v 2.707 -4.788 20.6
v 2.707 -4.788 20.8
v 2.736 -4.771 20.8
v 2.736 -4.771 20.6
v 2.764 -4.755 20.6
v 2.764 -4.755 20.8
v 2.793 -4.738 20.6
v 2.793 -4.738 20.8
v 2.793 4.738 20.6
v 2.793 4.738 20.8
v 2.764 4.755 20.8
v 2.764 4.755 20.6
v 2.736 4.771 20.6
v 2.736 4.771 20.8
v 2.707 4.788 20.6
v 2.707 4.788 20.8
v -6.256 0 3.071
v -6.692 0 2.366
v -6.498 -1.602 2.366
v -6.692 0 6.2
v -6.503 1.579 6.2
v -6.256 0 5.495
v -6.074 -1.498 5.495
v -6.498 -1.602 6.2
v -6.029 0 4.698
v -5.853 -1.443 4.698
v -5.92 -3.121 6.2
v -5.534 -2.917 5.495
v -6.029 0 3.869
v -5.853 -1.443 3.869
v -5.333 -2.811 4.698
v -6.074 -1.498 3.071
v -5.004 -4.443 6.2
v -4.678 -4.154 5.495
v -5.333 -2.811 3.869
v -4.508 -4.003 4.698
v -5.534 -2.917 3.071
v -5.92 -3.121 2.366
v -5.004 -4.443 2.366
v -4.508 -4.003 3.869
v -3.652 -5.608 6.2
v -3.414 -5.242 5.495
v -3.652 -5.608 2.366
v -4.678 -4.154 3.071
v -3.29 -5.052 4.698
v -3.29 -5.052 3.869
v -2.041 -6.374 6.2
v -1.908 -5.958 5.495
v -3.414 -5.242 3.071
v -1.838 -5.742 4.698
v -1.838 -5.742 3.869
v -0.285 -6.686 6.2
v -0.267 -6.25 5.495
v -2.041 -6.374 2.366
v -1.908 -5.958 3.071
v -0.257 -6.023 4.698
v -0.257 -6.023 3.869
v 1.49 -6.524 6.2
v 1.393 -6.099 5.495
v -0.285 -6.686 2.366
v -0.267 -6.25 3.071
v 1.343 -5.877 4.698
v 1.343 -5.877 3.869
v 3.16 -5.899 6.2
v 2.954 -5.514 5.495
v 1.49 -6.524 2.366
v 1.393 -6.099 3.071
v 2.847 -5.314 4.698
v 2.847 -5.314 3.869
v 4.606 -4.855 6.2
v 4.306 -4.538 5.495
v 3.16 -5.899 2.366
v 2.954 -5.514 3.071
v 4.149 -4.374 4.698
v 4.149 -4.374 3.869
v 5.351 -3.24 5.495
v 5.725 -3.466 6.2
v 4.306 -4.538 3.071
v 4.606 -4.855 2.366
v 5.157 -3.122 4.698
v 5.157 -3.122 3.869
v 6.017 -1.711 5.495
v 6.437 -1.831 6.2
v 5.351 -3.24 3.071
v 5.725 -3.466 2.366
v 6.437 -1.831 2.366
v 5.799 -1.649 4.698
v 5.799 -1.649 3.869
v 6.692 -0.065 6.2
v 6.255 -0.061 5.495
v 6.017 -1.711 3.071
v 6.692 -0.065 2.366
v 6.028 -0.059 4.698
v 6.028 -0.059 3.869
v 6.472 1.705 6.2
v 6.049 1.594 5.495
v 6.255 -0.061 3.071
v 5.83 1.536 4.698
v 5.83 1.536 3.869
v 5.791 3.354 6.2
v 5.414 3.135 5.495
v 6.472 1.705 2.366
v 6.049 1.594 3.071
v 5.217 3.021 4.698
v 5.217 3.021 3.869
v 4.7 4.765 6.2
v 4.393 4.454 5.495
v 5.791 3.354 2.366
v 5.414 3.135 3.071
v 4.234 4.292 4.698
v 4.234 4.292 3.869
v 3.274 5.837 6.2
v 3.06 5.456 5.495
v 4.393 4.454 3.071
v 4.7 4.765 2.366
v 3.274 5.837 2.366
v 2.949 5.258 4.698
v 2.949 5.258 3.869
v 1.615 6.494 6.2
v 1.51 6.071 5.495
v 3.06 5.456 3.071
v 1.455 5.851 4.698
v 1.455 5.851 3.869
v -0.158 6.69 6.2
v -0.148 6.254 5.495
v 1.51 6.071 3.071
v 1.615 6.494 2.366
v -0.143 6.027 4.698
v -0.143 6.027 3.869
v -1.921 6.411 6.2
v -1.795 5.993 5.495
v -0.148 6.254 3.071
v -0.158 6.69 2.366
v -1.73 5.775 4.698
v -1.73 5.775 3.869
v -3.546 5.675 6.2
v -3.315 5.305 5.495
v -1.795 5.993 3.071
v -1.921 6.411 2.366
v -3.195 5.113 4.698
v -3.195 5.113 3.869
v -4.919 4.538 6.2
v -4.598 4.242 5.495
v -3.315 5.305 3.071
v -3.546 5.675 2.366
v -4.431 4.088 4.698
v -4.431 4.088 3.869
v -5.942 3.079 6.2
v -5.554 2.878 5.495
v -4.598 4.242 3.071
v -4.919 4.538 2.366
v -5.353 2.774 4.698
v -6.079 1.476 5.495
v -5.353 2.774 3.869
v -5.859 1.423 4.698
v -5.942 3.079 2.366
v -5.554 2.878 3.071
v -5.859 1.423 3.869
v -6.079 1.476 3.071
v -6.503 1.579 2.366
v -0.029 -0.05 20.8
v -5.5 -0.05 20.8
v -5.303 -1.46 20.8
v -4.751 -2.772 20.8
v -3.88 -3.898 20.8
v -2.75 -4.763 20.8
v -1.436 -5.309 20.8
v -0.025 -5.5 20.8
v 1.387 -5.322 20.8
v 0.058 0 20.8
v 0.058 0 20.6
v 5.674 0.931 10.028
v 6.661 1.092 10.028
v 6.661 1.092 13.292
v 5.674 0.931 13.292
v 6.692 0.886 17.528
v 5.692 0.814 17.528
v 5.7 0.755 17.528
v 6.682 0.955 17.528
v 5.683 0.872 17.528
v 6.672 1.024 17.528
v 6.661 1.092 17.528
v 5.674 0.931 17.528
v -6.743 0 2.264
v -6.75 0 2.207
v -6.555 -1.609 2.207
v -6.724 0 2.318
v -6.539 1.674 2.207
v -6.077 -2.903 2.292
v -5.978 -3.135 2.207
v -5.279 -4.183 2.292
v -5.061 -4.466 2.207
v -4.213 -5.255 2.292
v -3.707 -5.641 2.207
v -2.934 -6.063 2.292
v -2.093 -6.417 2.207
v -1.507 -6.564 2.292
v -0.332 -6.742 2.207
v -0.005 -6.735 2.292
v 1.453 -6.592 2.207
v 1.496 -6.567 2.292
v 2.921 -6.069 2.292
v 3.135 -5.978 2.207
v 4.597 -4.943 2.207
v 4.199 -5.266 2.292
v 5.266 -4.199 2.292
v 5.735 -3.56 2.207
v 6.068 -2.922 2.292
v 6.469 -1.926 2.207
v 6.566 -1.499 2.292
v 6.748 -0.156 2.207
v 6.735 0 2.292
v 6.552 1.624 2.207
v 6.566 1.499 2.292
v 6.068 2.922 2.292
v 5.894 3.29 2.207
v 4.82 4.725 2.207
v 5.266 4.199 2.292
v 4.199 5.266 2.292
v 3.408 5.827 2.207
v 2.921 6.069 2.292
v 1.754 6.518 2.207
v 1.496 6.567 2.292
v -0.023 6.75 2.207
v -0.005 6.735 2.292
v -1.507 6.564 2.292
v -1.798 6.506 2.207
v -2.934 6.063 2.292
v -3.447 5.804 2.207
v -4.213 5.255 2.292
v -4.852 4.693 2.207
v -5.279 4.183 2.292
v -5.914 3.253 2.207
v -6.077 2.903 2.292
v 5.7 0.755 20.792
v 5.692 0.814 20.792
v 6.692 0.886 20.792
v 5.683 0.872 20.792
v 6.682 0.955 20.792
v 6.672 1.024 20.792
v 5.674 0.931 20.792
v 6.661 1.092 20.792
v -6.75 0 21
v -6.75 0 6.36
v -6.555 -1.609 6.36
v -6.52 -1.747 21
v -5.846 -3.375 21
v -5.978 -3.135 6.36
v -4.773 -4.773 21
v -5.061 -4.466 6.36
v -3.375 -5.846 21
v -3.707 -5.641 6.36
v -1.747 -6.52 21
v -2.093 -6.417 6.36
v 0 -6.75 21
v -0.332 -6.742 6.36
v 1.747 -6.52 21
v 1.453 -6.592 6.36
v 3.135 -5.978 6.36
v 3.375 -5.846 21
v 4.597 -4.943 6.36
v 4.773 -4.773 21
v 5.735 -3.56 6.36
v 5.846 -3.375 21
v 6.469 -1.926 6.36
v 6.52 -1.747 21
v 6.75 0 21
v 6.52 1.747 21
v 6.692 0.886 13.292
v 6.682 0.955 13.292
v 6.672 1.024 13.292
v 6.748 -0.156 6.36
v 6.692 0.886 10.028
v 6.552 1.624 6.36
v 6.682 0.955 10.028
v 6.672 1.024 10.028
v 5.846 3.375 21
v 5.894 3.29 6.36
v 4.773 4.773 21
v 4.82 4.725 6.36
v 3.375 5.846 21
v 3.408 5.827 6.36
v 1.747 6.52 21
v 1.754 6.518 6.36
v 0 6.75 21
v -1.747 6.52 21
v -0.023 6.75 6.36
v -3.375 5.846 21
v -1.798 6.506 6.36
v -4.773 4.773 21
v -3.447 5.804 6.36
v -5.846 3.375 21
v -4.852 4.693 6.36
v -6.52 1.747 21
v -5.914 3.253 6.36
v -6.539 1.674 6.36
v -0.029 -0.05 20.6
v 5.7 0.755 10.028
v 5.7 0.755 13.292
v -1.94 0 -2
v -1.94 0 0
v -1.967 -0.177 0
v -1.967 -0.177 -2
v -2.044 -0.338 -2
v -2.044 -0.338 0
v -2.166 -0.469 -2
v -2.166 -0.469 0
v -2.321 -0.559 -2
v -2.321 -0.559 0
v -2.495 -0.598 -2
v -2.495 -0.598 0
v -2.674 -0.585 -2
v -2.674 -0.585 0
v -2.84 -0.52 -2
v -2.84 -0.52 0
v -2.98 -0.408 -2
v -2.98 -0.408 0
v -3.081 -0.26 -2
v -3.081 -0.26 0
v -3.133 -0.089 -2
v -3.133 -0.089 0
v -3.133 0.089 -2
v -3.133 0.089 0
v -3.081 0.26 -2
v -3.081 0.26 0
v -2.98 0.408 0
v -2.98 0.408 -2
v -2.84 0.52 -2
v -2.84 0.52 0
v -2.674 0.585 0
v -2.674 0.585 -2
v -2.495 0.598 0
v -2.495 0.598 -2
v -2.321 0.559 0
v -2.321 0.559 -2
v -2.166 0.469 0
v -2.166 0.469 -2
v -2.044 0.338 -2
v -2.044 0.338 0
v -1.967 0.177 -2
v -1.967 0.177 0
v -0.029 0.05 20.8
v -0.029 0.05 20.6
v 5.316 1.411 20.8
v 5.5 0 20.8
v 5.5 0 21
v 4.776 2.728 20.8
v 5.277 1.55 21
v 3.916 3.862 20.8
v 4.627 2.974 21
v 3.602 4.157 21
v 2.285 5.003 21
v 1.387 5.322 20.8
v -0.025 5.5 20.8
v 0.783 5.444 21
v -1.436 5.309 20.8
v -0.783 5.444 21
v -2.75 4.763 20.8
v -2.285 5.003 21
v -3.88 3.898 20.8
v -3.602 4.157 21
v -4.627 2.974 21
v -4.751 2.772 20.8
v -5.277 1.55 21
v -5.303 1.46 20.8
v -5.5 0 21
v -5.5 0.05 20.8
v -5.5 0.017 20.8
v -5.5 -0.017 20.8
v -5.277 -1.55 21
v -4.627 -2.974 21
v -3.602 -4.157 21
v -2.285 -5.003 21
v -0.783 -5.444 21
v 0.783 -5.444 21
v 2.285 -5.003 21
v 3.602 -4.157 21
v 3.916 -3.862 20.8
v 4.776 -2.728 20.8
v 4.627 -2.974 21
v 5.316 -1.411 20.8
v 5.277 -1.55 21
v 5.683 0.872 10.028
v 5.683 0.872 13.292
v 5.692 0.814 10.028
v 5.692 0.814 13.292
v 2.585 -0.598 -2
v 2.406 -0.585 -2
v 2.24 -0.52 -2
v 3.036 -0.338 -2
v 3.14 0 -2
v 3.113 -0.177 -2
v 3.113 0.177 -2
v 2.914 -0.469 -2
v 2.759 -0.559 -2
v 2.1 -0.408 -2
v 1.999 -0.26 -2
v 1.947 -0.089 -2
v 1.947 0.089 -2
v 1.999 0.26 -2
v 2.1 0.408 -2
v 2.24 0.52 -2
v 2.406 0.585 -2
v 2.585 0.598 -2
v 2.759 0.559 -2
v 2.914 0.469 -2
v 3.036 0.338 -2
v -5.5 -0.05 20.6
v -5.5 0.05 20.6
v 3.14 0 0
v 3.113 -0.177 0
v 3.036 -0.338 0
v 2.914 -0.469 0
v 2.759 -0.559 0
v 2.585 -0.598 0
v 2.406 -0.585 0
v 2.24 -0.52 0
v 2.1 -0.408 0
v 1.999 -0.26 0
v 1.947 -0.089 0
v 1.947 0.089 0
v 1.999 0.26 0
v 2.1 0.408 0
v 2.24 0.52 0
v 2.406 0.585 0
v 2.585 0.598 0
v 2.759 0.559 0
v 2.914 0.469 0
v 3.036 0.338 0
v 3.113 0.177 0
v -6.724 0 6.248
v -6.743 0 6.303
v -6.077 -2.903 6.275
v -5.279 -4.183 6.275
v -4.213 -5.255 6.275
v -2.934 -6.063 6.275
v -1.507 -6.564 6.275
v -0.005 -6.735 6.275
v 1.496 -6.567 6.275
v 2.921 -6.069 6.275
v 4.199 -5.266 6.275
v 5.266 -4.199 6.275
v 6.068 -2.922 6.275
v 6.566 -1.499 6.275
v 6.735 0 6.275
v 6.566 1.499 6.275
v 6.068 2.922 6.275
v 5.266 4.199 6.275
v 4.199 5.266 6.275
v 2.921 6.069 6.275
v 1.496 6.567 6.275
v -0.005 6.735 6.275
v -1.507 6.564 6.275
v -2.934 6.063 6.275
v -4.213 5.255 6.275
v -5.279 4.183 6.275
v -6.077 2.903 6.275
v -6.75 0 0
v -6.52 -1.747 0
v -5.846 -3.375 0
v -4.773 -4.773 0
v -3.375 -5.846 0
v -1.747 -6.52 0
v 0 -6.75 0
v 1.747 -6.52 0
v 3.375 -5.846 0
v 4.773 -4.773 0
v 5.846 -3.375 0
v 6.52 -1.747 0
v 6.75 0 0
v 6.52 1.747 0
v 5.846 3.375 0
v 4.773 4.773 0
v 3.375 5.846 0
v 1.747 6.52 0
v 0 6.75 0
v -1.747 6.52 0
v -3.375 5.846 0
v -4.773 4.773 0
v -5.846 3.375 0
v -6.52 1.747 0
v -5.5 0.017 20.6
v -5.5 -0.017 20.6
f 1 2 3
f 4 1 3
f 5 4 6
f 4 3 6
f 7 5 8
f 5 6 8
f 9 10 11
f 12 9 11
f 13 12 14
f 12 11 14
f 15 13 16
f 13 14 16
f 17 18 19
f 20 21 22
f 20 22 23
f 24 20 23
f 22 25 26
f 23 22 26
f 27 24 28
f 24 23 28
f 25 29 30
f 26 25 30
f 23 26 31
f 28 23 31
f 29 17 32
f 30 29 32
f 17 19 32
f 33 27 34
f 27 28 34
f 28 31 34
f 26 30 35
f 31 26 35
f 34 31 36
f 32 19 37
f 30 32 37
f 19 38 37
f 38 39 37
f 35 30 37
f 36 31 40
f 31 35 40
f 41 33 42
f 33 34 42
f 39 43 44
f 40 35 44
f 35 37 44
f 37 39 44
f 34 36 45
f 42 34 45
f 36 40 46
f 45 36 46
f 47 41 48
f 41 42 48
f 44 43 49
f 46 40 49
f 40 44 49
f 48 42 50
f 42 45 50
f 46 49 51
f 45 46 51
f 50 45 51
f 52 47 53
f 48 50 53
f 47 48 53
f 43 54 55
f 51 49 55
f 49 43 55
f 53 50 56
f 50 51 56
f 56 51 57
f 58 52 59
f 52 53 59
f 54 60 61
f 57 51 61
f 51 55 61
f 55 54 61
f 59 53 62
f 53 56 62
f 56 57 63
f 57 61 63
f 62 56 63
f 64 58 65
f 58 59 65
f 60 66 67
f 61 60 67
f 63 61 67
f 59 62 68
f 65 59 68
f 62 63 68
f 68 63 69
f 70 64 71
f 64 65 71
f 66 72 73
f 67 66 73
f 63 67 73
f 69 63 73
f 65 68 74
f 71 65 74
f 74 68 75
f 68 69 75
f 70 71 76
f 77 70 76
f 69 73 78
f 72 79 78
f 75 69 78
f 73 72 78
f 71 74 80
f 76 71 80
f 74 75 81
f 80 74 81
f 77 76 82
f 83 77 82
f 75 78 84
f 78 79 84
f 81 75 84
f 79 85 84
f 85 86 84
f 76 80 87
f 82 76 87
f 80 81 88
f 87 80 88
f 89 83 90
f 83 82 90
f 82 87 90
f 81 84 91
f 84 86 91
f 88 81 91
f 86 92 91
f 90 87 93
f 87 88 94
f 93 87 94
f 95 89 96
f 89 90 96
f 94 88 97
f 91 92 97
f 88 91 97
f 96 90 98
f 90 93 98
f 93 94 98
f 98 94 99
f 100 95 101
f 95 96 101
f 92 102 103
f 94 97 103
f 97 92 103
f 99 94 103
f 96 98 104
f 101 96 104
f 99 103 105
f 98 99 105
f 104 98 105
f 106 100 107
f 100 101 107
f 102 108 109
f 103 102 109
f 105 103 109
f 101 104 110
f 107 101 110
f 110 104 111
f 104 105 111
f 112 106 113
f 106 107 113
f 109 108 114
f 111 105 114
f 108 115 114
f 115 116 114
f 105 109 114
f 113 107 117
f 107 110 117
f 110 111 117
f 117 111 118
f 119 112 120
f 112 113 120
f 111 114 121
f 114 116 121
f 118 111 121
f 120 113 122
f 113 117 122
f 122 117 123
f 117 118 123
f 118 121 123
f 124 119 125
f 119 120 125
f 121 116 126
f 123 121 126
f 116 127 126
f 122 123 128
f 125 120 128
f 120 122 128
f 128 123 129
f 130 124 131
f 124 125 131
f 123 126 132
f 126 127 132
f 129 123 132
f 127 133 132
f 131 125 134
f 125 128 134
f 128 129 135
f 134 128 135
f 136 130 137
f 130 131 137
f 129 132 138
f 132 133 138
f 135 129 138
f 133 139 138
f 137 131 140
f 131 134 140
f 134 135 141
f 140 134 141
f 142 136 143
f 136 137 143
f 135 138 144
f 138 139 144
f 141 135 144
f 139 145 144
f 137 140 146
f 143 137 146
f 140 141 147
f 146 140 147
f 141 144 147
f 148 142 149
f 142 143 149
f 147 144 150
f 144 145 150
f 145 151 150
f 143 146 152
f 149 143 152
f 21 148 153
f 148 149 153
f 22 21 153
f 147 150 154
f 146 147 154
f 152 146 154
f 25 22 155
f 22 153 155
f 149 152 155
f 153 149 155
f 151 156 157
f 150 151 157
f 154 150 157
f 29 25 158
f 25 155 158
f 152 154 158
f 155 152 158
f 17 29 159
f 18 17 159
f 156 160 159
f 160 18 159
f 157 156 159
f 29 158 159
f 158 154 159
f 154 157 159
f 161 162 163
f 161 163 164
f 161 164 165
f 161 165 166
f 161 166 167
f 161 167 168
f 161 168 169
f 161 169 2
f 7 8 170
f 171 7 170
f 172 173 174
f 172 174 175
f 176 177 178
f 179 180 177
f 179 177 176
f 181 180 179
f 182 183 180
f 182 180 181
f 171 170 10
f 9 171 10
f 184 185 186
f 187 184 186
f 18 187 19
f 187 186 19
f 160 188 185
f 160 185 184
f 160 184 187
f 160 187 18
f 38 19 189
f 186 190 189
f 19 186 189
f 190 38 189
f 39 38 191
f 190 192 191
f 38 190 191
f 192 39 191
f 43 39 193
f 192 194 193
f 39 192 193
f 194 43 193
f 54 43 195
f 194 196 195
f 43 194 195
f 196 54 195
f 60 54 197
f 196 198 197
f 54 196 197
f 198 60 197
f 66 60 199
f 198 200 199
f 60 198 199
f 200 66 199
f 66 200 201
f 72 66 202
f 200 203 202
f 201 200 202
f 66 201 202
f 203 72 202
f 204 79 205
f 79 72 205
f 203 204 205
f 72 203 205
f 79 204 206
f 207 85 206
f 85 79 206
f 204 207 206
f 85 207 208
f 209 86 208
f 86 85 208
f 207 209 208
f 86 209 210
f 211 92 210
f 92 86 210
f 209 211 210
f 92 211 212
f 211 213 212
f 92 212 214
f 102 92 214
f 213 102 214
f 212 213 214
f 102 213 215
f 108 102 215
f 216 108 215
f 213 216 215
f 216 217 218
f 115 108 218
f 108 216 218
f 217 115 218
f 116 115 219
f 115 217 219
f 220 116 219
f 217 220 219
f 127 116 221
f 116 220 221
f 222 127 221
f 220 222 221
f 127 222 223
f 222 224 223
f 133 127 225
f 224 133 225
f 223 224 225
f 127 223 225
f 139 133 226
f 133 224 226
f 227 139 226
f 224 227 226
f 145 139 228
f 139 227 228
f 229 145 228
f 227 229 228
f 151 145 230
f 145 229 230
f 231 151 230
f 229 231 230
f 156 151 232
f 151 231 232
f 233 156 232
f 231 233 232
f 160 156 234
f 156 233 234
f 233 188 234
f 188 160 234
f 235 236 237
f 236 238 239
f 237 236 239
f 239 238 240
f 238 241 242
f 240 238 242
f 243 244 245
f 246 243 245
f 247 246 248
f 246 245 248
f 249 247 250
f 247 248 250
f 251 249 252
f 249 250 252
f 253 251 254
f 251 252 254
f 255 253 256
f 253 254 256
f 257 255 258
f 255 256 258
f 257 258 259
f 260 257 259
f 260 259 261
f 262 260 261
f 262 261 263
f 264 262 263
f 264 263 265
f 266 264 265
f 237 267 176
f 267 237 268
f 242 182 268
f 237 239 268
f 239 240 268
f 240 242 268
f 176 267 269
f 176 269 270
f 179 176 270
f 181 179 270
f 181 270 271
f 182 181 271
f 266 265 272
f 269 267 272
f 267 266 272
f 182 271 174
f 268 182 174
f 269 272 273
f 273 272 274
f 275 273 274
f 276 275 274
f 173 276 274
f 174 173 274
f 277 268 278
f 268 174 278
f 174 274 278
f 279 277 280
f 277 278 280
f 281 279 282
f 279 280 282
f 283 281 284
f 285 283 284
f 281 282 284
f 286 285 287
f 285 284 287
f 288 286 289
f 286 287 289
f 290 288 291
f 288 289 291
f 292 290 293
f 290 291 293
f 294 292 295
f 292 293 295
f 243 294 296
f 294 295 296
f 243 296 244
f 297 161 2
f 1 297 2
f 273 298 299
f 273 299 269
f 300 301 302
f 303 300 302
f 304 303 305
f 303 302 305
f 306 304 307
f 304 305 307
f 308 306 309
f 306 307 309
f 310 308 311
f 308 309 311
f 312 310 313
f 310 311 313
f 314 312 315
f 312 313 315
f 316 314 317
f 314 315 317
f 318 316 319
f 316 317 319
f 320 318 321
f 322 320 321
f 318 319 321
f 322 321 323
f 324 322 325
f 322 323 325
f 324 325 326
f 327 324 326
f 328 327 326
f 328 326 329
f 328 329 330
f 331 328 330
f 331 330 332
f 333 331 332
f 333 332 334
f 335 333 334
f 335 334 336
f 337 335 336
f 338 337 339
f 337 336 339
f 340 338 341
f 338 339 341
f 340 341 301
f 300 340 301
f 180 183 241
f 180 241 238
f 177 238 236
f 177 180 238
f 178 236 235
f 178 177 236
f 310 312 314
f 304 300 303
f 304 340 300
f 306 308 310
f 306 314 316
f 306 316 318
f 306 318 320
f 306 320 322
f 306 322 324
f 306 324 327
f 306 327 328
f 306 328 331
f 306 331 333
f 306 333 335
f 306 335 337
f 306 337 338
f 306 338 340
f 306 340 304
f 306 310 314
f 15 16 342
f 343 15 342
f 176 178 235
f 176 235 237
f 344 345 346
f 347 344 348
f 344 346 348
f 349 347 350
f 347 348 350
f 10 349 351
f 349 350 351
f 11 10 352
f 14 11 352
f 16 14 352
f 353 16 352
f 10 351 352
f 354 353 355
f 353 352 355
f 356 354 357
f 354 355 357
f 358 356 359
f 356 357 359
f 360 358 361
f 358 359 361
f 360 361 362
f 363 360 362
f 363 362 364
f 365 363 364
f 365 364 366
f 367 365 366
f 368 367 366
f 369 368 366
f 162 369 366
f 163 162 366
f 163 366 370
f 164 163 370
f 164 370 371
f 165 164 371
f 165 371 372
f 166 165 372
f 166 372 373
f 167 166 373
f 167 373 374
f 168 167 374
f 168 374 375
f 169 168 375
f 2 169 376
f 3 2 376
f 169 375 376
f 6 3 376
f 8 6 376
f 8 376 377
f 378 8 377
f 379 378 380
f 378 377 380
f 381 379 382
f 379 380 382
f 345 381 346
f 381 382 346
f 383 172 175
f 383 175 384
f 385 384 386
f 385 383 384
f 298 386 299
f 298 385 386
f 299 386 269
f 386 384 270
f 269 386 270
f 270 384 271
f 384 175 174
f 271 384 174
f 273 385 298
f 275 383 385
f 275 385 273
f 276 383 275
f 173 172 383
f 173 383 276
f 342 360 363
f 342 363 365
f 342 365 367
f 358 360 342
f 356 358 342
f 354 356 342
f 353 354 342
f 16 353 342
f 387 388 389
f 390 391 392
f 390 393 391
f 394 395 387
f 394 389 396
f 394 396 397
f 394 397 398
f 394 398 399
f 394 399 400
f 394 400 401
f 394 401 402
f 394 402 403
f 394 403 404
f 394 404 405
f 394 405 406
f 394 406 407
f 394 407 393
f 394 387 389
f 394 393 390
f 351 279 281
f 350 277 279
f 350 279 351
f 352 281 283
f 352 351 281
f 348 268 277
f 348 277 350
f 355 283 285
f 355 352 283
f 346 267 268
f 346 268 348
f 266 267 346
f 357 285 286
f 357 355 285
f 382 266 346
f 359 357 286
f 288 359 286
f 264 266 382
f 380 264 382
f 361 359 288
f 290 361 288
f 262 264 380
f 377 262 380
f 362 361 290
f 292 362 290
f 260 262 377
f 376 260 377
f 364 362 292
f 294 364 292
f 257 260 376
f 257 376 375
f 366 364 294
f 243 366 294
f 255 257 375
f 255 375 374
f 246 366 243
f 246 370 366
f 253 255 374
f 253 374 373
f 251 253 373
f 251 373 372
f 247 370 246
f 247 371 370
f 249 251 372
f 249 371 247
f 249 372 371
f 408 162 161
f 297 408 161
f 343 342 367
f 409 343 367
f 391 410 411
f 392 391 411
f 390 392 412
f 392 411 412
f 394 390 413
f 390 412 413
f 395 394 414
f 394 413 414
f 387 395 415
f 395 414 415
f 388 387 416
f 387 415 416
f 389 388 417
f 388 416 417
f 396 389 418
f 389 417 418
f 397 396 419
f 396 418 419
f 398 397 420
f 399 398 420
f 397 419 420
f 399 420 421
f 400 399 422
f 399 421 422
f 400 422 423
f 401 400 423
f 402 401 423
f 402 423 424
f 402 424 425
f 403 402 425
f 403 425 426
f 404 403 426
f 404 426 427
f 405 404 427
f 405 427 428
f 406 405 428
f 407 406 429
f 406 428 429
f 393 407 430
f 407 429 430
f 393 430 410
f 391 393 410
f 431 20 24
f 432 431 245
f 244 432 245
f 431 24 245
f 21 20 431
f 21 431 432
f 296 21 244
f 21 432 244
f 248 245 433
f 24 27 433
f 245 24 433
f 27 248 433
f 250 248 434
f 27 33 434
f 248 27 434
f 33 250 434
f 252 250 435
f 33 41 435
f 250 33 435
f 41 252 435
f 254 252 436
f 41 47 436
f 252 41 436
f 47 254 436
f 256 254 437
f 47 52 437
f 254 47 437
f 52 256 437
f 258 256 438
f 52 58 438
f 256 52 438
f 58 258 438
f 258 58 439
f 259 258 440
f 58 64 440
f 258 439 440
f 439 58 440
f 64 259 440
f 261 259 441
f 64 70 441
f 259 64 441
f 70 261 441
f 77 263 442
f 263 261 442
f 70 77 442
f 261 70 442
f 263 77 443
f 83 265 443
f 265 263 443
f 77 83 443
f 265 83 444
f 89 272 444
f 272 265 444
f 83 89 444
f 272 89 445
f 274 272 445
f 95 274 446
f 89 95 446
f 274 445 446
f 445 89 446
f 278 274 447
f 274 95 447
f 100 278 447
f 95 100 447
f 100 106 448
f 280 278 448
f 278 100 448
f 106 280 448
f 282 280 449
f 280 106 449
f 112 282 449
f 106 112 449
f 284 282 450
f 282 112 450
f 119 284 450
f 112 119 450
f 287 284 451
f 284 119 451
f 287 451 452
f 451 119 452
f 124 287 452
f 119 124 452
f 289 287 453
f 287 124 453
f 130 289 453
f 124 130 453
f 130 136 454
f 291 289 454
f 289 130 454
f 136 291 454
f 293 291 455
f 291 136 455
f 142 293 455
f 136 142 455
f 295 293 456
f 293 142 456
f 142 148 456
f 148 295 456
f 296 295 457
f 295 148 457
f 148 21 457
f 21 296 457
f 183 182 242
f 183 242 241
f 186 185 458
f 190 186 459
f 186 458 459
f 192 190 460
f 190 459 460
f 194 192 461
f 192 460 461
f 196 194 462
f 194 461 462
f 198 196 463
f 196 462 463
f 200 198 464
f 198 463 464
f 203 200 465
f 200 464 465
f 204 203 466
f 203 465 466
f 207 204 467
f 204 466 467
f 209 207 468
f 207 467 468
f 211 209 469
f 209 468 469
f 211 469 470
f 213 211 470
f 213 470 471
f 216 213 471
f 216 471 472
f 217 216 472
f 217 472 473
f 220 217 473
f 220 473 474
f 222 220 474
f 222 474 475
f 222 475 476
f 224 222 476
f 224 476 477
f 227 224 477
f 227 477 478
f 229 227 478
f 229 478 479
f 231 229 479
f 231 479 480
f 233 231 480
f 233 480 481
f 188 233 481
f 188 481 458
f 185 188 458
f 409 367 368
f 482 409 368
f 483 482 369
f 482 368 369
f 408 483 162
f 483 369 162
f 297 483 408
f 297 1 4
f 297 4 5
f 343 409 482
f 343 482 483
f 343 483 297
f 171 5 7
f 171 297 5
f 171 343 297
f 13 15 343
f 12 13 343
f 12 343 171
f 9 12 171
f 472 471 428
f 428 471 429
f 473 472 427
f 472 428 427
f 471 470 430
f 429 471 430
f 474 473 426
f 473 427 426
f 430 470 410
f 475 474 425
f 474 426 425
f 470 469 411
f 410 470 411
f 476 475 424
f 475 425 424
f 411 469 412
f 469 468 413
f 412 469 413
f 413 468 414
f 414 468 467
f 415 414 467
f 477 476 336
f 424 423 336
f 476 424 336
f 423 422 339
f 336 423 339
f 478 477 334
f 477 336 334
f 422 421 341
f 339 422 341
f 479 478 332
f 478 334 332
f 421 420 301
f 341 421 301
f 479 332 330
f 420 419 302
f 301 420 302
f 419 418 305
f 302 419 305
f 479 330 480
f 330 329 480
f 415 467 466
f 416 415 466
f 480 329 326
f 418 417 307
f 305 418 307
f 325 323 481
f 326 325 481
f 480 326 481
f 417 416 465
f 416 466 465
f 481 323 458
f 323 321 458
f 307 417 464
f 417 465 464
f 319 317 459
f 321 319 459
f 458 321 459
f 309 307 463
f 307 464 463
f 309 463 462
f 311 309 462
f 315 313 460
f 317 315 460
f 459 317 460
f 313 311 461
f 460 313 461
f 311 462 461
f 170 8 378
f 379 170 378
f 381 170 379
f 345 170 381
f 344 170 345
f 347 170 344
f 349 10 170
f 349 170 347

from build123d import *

# Parameters (mm, degrees)
SKETCH_1_R          = 6.75
EXTRUDE_1_DEPTH     = 21
SKETCH_2_R          = 5.5
CUT_EXTRUDE_1_DEPTH = 0.2
CUT_EXTRUDE_2_DEPTH = 0.2
FILLET_1_R          = 0.25
SKETCH_5_R          = 0.6
EXTRUDE_2_DEPTH     = 2
WRAP_START          = 10.027777778
WRAP_2_DEPTH        = 3.263888889
WRAP_START_2        = 17.527777778
WRAP_2_2_DEPTH      = 3.263888889


# Read off the part's stored shape, not the designer's step: 包覆2
with BuildPart() as part:
    # 草图1 → 凸台-拉伸1 (new body)
    with BuildSketch(Plane.XY):
        with Locations(Location((0, 0, 0), (0, 0, 180))):
            Circle(SKETCH_1_R)
    extrude(amount=EXTRUDE_1_DEPTH)

    # 草图2 → 切除-拉伸1 (cut)
    with BuildSketch(Plane.XY.offset(21)):
        Circle(SKETCH_2_R)
    extrude(amount=-CUT_EXTRUDE_1_DEPTH, mode=Mode.SUBTRACT)

    # 草图3 → 切除-拉伸2 (cut)
    with BuildSketch(Plane.XY.offset(20.8)):
        with BuildLine():
            Line((-0.04330127, 0.025), (-0.028867513, 0.05))
            Line((-0.028867513, 0.05), (-5.499772723, 0.05))
            ThreePointArc((-5.499772723, 0.05), (-5.5, 0), (-5.499772723, -0.05))
            Line((-5.499772723, -0.05), (-0.028867513, -0.05))
            Line((-0.028867513, -0.05), (-0.04330127, -0.025))
            Line((-0.04330127, -0.025), (0, 0))
            Line((0, 0), (-0.04330127, 0.025))
        make_face()
        with BuildLine():
            Line((0.04330127, -0.025), (0, 0))
            Line((0, 0), (0, -0.05))
            Line((0, -0.05), (-0.028867513, -0.05))
            Line((-0.028867513, -0.05), (2.706585091, -4.787942893))
            ThreePointArc((2.706585091, -4.787942893), (2.75, -4.763139721), (2.793187631, -4.737942893))
            Line((2.793187631, -4.737942893), (0.057735027, 0))
            Line((0.057735027, 0), (0.04330127, -0.025))
        make_face()
        with BuildLine():
            Line((-0.028867513, 0.05), (0, 0.05))
            Line((0, 0.05), (0, 0))
            Line((0, 0), (0.04330127, 0.025))
            Line((0.04330127, 0.025), (0.057735027, 0))
            Line((0.057735027, 0), (2.793187631, 4.737942893))
            ThreePointArc((2.793187631, 4.737942893), (2.75, 4.763139721), (2.706585091, 4.787942893))
            Line((2.706585091, 4.787942893), (-0.028867513, 0.05))
        make_face()
        Polygon((0, 0), (0, 0.05), (-0.028867513, 0.05), (-0.04330127, 0.025), align=None)
        Polygon((0, -0.05), (0, 0), (-0.04330127, -0.025), (-0.028867513, -0.05), align=None)
        Polygon((0.04330127, 0.025), (0, 0), (0.04330127, -0.025), (0.057735027, 0), align=None)
    extrude(amount=-CUT_EXTRUDE_2_DEPTH, mode=Mode.SUBTRACT)

    # 草图4 → 切除-旋转1 (revolve, cut)
    with BuildSketch(Plane(origin=(0, 0, 0), x_dir=(1, 0, 0), z_dir=(0, 1, 0))):
        with BuildLine():
            Line((-6.818421305, -2.223982894), (-6.818421305, -6.342581877))
            ThreePointArc((-6.818421305, -6.342581877), (-6, -4.283282386), (-6.818421305, -2.223982894))
        make_face()
    revolve(axis=Axis((0, 0, 0), (0, 0, 1)), mode=Mode.SUBTRACT)

    # 圆角1
    fillet_1_edges = [part.edges().sort_by_distance(p)[0] for p in [
        (6.75, 0, 6.267595869),
        (6.75, 0, 2.298968902),
    ]]
    fillet(fillet_1_edges, radius=FILLET_1_R)

    # 草图5 → 凸台-拉伸2 (add)
    with BuildSketch(Plane(origin=(0, 0, 0), x_dir=(-1, 0, 0), z_dir=(0, 0, -1))):
        with Locations(Location((2.54, 0, 0), (0, 0, 180))):
            Circle(SKETCH_5_R)
        with Locations(Location((-2.54, 0, 0), (0, 0, 180))):
            Circle(SKETCH_5_R)
    extrude(amount=EXTRUDE_2_DEPTH)

    # 包覆2 outline → 包覆2 (cut)
    with BuildSketch(Plane.XY.offset(WRAP_START)):
        with BuildLine():
            Line((6.661018662, 1.092396624), (5.674201083, 0.930560087))
            ThreePointArc((5.674201083, 0.930560087), (5.687885367, 0.842887927), (5.700215109, 0.755015037))
            Line((5.700215109, 0.755015037), (6.691556868, 0.886322))
            ThreePointArc((6.691556868, 0.886322), (6.677082822, 0.989477131), (6.661018662, 1.092396624))
        make_face()
    extrude(amount=WRAP_2_DEPTH, mode=Mode.SUBTRACT)

    # Wrap 2 2 outline → Wrap 2 2 (cut)
    with BuildSketch(Plane.XY.offset(WRAP_START_2)):
        with BuildLine():
            Line((6.661018662, 1.092396624), (5.674201083, 0.930560087))
            ThreePointArc((5.674201083, 0.930560087), (5.687885367, 0.842887927), (5.700215109, 0.755015037))
            Line((5.700215109, 0.755015037), (6.691556868, 0.886322))
            ThreePointArc((6.691556868, 0.886322), (6.677082822, 0.989477131), (6.661018662, 1.092396624))
        make_face()
    extrude(amount=WRAP_2_2_DEPTH, mode=Mode.SUBTRACT)


solid = part.part
